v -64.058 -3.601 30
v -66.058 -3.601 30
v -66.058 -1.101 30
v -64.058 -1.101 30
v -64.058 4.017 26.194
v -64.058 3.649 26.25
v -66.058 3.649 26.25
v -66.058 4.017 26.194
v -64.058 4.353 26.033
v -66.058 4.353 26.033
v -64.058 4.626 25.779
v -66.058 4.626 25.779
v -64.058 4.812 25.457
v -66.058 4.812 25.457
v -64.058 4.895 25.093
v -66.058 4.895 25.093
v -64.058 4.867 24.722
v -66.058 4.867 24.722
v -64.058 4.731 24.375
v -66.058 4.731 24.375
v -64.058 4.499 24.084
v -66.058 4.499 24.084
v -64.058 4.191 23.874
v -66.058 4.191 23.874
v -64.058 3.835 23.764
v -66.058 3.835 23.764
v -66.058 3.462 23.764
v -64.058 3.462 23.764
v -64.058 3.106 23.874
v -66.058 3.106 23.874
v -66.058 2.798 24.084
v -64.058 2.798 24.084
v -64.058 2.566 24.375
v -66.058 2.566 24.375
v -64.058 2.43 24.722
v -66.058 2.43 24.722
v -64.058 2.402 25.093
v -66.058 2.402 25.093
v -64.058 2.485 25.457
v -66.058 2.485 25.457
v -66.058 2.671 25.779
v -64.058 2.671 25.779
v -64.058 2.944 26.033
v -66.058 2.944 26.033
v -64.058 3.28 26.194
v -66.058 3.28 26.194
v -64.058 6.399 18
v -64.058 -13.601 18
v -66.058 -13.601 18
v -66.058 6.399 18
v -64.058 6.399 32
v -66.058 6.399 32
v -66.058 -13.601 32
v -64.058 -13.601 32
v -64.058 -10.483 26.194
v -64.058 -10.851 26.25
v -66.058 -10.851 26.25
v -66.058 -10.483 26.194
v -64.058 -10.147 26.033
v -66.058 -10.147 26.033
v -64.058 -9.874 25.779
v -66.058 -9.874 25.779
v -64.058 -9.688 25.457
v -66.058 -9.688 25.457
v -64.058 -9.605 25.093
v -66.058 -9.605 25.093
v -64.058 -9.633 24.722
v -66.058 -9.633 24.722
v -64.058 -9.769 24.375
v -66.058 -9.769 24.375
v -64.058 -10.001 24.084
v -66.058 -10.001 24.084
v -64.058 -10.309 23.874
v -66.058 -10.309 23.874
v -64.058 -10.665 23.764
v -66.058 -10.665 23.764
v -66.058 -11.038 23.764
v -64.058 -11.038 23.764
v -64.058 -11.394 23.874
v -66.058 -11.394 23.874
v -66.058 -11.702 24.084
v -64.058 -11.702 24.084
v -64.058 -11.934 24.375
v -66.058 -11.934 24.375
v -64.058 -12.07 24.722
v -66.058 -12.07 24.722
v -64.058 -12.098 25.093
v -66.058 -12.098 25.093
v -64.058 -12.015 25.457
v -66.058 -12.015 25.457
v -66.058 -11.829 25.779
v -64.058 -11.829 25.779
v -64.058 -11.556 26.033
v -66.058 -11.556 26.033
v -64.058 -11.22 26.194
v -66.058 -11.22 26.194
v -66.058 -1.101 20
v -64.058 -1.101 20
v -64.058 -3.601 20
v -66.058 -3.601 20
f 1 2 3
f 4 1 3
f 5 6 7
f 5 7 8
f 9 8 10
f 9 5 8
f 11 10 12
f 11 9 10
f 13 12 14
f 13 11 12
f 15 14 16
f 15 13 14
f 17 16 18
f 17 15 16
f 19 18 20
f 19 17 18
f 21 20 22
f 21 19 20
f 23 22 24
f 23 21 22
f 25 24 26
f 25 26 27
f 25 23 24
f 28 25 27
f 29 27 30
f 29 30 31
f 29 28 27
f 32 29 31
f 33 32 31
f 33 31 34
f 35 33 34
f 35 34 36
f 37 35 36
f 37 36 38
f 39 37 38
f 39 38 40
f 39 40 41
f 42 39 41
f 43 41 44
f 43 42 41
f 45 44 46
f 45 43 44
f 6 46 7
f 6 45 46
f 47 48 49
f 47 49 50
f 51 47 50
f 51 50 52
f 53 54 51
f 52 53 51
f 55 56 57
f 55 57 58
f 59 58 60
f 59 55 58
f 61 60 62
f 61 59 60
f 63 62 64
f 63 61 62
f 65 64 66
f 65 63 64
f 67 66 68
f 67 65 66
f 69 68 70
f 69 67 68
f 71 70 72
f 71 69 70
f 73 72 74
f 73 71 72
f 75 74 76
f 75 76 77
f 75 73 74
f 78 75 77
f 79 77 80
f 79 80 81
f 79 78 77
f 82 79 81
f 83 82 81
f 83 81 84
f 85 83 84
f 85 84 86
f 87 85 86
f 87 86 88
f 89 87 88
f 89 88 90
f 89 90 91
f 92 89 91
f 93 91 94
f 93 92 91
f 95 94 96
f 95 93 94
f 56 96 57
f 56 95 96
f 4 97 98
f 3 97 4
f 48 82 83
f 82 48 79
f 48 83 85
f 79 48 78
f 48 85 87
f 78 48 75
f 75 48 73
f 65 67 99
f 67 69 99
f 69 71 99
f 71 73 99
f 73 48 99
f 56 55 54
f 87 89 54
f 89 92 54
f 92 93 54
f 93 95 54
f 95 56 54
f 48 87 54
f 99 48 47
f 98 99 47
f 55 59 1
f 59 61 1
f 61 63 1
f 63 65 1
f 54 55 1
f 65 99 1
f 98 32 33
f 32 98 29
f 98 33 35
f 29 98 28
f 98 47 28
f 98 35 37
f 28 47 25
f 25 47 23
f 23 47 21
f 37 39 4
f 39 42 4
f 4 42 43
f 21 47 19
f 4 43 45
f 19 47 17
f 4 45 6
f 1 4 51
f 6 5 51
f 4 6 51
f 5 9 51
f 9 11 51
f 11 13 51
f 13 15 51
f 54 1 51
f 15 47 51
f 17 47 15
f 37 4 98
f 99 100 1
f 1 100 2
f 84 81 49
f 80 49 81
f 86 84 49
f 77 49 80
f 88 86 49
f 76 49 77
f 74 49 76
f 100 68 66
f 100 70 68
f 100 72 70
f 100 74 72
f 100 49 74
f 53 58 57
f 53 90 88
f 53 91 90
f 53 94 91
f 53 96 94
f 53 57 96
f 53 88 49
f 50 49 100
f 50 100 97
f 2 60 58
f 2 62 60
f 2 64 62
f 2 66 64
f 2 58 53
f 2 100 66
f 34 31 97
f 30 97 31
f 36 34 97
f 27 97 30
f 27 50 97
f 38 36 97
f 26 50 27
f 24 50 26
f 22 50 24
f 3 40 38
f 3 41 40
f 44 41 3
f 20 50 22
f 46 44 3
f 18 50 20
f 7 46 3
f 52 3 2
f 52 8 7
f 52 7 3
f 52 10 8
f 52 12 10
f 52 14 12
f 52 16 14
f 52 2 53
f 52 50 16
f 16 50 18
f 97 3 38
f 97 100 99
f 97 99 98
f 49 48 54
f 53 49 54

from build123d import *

# Parameters (mm, degrees)
SKETCH1_W           = 14
SKETCH1_H           = 20
SKETCH1_R           = 1.25
BOSS_EXTRUDE1_DEPTH = 2
SKETCH2_W           = 10
SKETCH2_H           = 2.5
CUT_EXTRUDE1_DEPTH  = 2


with BuildPart() as part:
    # Sketch1 → Boss-Extrude1 (new body)
    with BuildSketch(Plane.ZY.offset(64.057810508)):
        with Locations((25, -3.601413474)):
            Rectangle(SKETCH1_W, SKETCH1_H)
        with Locations((25, -10.851413474)):
            Circle(SKETCH1_R, mode=Mode.SUBTRACT)
        with Locations((25, 3.648586526)):
            Circle(SKETCH1_R, mode=Mode.SUBTRACT)
    extrude(amount=BOSS_EXTRUDE1_DEPTH)

    # Sketch2 → Cut-Extrude1 (cut)
    with BuildSketch(Plane.ZY.offset(66.057810508)):
        with Locations((25, -2.351413474)):
            Rectangle(SKETCH2_W, SKETCH2_H)
    extrude(amount=-CUT_EXTRUDE1_DEPTH, mode=Mode.SUBTRACT)


solid = part.part
